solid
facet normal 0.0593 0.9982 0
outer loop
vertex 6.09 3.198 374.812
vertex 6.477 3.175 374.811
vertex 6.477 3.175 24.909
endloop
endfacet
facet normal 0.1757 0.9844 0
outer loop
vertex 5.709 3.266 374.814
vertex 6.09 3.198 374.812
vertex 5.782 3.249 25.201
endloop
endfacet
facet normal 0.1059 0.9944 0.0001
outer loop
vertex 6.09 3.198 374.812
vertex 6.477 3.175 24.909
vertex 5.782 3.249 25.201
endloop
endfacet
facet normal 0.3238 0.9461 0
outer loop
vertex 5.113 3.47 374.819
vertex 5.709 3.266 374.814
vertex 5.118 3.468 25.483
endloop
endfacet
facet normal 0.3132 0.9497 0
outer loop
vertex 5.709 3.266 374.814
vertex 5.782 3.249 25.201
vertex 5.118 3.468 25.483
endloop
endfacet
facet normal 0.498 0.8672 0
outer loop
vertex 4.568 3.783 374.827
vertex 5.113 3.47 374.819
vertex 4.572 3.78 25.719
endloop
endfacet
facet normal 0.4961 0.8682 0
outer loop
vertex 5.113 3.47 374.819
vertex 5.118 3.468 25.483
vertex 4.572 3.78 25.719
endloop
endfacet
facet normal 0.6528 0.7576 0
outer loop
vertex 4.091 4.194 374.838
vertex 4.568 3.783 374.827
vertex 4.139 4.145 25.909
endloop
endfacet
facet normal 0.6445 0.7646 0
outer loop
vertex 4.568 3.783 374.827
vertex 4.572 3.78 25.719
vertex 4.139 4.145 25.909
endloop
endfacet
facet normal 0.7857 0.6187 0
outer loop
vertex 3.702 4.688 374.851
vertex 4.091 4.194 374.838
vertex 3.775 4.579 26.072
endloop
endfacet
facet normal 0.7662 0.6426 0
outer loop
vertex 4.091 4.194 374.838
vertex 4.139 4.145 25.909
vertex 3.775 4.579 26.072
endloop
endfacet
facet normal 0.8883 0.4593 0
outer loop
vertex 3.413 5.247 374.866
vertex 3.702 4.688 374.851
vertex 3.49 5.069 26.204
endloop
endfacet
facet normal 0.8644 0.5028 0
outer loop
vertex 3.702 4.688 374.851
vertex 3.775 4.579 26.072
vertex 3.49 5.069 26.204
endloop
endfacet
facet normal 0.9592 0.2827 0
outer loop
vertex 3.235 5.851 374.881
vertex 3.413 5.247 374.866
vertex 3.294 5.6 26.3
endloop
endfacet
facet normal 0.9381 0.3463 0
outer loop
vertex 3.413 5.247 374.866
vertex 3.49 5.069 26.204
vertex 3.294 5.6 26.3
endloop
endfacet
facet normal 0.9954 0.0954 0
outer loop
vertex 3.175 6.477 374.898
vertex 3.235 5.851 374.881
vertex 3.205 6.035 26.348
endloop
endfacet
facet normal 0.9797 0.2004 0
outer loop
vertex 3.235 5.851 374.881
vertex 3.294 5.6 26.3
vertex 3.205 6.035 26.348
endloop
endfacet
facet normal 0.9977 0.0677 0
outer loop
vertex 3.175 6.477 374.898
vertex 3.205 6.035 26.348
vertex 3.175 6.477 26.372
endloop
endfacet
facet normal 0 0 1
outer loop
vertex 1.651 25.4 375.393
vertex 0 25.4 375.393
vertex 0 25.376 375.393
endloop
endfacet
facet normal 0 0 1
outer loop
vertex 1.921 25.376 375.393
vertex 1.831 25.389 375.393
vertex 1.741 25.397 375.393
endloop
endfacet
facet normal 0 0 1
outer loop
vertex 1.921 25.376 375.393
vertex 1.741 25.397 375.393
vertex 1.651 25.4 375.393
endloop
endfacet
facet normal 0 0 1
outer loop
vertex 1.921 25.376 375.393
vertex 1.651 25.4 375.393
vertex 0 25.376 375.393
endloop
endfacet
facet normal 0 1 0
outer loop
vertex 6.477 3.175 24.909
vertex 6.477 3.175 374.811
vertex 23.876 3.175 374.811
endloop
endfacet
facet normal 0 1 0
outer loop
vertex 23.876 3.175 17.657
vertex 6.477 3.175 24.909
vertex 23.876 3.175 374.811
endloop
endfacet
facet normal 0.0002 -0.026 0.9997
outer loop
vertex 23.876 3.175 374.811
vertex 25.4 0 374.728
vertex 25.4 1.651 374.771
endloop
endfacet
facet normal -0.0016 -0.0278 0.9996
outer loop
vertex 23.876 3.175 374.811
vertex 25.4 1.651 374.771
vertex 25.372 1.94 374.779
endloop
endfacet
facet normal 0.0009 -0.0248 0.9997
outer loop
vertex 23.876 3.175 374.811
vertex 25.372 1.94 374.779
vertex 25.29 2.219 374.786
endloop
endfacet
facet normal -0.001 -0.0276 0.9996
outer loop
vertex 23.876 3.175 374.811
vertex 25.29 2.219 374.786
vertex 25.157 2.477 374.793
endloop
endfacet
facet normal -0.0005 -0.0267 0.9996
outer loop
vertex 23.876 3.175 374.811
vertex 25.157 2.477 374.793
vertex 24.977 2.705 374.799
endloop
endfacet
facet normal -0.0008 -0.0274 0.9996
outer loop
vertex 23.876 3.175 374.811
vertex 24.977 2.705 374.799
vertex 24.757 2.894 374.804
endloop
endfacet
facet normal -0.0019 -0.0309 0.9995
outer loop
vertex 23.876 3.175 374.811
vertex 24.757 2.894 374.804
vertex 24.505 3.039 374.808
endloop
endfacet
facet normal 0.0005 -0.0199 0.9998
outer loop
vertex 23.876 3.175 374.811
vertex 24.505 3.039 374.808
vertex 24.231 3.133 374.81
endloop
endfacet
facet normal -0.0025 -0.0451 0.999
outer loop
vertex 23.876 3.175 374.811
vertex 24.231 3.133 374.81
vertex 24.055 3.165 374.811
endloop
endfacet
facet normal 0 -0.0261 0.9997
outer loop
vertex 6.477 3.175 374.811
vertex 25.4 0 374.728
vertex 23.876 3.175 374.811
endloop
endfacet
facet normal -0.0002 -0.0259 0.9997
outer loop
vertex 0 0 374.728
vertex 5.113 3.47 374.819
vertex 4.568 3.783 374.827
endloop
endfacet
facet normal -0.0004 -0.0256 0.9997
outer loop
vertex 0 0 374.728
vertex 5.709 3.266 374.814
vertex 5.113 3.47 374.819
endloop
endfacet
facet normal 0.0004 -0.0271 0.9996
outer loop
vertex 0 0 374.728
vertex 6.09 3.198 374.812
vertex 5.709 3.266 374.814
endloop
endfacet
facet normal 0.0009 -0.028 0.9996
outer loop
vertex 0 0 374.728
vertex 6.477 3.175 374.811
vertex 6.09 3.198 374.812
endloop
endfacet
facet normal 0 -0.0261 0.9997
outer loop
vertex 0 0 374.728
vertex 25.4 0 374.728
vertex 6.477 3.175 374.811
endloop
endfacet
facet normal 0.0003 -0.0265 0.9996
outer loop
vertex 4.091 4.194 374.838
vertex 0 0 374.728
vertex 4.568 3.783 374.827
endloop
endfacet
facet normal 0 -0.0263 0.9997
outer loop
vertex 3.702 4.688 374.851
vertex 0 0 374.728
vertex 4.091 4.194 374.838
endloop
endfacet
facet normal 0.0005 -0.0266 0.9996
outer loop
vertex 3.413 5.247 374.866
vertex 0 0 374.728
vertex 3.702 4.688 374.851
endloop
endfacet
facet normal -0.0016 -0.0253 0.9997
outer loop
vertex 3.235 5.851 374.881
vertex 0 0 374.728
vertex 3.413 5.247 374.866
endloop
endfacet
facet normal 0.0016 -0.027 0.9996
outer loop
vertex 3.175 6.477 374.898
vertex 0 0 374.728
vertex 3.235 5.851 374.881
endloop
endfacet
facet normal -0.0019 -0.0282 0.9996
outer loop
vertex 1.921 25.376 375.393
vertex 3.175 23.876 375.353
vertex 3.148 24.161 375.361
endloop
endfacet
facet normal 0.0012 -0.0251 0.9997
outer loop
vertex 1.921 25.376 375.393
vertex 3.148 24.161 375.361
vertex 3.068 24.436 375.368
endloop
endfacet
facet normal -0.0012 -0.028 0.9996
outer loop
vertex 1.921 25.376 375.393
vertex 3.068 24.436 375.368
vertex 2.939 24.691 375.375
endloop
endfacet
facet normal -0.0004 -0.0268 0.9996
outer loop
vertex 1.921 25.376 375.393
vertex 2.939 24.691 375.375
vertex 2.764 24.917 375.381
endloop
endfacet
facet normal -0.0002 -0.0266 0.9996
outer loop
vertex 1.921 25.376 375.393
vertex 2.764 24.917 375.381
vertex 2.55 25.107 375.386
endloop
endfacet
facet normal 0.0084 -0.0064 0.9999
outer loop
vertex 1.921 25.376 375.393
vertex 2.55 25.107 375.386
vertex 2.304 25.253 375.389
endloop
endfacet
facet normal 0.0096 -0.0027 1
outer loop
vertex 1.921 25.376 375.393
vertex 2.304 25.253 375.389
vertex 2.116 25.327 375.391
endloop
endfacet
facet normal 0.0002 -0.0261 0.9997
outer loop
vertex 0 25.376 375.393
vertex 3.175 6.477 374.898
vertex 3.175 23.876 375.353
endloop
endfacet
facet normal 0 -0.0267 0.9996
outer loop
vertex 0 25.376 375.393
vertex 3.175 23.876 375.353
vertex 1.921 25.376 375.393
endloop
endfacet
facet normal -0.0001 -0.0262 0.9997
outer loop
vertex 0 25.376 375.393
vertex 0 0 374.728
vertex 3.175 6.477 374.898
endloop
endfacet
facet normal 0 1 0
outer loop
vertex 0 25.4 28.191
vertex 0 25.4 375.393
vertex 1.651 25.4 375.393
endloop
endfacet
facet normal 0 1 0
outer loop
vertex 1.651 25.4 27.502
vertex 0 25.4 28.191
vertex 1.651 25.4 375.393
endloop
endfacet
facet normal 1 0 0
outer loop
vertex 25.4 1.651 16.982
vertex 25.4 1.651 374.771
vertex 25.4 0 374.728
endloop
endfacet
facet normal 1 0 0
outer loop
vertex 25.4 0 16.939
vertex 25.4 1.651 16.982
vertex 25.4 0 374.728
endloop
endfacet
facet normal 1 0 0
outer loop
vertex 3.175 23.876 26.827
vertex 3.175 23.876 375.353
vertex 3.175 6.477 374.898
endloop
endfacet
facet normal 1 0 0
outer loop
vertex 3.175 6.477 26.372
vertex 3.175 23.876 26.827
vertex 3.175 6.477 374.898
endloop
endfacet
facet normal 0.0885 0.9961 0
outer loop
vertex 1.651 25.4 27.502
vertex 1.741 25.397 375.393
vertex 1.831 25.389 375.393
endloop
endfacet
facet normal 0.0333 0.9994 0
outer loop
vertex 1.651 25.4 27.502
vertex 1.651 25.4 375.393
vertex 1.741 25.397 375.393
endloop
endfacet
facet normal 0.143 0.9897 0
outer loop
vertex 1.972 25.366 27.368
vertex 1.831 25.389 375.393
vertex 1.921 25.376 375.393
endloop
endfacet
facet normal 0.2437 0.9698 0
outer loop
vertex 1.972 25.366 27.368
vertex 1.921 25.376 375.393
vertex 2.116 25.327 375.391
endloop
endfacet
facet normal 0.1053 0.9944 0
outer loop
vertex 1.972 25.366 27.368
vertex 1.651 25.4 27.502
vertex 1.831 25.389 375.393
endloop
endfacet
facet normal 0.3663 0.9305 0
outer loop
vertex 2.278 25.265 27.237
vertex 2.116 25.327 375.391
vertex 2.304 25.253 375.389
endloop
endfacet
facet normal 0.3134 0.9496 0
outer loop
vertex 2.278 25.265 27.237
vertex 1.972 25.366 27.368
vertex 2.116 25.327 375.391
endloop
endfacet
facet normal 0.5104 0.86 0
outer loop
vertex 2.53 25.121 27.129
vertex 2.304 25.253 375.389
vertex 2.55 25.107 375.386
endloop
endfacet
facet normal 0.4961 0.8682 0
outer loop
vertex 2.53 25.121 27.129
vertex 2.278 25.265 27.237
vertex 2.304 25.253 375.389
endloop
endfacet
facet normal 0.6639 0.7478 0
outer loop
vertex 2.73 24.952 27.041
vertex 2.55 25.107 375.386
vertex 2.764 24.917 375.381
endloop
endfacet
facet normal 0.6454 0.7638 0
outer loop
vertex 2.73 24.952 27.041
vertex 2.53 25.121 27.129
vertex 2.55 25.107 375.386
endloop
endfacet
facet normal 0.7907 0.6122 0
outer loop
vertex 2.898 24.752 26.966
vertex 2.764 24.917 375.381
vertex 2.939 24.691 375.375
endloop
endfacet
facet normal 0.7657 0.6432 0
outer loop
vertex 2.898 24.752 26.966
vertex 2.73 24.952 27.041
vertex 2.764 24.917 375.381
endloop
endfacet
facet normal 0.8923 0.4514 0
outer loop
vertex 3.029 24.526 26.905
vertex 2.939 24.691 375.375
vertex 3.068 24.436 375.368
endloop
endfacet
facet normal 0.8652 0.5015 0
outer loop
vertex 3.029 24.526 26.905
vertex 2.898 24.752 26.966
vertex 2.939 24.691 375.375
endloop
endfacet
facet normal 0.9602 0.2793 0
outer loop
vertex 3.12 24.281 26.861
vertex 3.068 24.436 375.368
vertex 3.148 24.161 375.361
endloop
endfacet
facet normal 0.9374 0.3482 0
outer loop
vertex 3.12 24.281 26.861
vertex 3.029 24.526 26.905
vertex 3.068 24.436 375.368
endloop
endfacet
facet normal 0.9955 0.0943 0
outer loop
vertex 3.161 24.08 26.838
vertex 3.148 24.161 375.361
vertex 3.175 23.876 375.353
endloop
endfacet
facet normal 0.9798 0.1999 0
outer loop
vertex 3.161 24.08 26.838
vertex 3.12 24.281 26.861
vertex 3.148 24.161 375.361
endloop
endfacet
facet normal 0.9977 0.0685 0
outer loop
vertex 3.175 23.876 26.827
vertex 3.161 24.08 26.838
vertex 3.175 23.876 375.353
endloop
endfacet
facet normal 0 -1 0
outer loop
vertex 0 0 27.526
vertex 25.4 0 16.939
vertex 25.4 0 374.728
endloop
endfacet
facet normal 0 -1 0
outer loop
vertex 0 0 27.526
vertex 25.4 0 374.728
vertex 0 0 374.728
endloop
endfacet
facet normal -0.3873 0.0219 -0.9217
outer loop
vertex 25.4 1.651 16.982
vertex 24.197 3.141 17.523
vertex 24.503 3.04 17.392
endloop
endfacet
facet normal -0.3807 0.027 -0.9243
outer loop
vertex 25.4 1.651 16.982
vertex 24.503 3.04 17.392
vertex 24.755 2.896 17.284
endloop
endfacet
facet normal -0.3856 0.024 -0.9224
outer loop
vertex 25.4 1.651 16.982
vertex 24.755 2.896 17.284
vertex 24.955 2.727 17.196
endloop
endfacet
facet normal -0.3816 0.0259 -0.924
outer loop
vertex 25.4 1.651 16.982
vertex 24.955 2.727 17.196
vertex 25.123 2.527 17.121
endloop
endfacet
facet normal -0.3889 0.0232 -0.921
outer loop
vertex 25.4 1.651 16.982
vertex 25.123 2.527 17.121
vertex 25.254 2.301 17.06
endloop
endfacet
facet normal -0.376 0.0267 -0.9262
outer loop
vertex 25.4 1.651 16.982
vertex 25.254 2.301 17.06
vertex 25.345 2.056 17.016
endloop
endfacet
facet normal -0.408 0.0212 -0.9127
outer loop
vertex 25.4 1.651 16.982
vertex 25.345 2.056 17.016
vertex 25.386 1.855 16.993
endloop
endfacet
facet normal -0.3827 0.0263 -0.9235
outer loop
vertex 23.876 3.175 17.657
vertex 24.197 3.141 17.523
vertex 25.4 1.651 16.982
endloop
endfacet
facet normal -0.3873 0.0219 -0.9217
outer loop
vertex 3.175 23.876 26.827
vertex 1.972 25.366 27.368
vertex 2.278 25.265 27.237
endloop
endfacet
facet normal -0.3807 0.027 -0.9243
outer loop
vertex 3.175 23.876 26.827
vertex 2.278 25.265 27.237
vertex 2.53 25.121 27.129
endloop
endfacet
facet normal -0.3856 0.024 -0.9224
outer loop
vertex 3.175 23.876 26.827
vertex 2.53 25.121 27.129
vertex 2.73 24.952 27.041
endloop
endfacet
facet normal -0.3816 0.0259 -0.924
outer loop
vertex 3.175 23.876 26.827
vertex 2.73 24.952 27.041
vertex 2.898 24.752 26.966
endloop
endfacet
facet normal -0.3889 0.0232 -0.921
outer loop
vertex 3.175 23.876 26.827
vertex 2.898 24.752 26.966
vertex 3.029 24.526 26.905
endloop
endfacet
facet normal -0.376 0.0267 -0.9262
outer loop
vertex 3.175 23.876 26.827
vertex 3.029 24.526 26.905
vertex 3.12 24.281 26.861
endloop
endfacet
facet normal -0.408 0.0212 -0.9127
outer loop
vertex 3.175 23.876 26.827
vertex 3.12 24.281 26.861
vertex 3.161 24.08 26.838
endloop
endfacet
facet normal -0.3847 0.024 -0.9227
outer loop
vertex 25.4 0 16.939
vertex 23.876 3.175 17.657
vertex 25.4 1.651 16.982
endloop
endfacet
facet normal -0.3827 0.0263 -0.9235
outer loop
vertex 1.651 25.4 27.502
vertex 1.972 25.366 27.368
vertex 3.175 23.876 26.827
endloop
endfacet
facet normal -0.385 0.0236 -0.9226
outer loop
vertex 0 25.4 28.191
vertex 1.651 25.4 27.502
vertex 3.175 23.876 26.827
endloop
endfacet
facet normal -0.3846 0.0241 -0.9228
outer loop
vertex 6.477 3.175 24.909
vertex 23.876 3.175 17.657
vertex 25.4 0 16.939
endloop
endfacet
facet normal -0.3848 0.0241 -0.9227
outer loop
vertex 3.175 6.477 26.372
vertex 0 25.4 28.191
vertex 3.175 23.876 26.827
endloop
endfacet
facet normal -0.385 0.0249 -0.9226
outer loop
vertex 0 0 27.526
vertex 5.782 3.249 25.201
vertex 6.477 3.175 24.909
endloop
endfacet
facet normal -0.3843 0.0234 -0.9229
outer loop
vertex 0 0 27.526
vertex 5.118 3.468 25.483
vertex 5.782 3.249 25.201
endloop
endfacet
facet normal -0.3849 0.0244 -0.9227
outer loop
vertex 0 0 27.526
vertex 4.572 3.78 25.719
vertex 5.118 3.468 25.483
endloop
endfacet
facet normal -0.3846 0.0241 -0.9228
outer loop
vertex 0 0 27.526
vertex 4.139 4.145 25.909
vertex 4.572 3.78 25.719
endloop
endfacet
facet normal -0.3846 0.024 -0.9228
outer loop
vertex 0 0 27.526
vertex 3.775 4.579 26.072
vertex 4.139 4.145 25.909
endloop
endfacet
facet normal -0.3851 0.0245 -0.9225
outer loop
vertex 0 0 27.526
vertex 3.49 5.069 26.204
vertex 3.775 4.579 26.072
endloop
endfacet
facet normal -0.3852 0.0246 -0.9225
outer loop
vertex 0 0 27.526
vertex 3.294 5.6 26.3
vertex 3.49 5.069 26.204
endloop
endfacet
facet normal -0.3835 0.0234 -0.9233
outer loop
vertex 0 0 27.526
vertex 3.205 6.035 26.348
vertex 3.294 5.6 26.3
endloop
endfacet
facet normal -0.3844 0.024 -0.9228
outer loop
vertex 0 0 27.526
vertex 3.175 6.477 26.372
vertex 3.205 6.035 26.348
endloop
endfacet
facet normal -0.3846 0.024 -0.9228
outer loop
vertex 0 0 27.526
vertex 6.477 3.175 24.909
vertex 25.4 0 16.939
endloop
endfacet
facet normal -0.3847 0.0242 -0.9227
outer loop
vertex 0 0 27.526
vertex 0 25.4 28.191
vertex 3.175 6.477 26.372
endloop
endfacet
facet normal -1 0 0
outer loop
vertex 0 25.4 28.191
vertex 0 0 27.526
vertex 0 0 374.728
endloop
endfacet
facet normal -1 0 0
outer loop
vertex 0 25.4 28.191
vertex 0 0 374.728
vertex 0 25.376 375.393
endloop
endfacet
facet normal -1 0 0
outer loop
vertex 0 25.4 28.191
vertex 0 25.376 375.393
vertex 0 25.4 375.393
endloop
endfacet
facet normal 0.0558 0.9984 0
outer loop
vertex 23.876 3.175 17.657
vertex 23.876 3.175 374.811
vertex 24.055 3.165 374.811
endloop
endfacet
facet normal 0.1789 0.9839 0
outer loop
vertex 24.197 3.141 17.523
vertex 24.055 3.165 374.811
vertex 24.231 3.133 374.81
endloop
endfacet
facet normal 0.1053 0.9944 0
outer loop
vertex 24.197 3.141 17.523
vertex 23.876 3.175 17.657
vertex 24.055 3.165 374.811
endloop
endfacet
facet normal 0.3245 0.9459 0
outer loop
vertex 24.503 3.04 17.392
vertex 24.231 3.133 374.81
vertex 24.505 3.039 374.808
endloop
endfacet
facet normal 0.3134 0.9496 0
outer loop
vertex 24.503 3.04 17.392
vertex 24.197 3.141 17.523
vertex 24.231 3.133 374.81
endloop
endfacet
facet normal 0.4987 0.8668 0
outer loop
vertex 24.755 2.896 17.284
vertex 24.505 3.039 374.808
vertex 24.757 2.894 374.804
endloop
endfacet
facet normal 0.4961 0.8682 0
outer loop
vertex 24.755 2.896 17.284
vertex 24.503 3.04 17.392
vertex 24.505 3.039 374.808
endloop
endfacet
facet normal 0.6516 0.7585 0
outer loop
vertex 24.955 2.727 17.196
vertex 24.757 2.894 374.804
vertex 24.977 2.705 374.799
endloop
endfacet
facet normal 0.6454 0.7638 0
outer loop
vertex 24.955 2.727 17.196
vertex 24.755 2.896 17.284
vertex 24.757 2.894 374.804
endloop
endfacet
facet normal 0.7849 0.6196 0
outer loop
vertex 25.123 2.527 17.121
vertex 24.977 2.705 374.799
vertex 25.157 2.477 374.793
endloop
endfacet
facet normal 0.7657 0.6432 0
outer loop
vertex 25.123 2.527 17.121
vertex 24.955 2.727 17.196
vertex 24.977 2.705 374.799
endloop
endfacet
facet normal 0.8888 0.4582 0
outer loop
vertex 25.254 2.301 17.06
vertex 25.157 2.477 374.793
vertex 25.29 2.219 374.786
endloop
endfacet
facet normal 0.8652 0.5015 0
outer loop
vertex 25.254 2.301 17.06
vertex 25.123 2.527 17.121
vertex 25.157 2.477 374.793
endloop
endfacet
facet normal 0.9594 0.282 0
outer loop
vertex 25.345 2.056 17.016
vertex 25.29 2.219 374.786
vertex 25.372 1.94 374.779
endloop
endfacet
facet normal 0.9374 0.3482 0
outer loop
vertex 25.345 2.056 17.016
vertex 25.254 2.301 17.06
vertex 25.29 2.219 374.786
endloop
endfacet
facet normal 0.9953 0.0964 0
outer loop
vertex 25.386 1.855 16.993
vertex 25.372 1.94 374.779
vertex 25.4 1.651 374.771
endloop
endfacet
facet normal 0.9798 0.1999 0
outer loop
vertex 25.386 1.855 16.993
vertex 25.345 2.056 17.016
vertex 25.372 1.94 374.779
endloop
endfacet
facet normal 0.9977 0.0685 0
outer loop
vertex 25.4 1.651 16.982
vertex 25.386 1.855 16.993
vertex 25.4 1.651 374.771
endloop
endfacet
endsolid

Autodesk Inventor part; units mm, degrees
ref_plane "Start Plane" through (0, 0, 16.9391) normal (0, 0, 1) x (1, 0, 0)
ref_plane "End Plane" through (0, 0, 375.3926) normal (0, 0, 1) x (1, 0, 0)
sketch "Sketch" plane through (0, 0, 0) normal (0, 0, 1) x (1, 0, 0)
  line L0 (25.4, 0) -> (0, 0)
  line L1 (0, 0) -> (0, 25.4)
  line L2 (0, 25.4) -> (1.651, 25.4)
  line L3 (3.175, 23.876) -> (3.175, 6.477)
  line L4 (6.477, 3.175) -> (23.876, 3.175)
  line L5 (25.4, 1.651) -> (25.4, 0)
  line L6 (0, -11.0414) -> (0, 31.5385) construction
  line L7 (-11.0414, 0) -> (31.5385, 0) construction
  arc A0 (3.175, 6.477) -> (6.477, 3.175) centre (6.477, 6.477) ccw
  arc A1 (3.175, 23.876) -> (1.651, 25.4) centre (1.651, 23.876) ccw
  arc A2 (25.4, 1.651) -> (23.876, 3.175) centre (23.876, 1.651) ccw
  line L8 (0, 40.0545) -> (0, -19.5574) construction
  line L9 (-19.5574, 0) -> (40.0545, 0) construction
  point P0 (3.175, 25.4)
  point P1 (3.175, 3.175)
  point P2 (25.4, 3.175)
  dimension "d0" = 25.4
  dimension "d1" = 25.4
  dimension "d2" = 3.175
  dimension "d3" = 3.175
  dimension "d10" = 0
  dimension "d11" = 0
  dimension "d14" = 3.302
  dimension "d15" = 1.524
extrude "Body" add sketch "Sketch" along normal up to surface (358.4535 mm away) from surface at 16.9391
sketch "Sketch3" plane through (0, 0, 0) normal (0, 0, 1) x (1, 0, 0)
  line L0 (0, 0) -> (10, 0)
ref_plane "Work Plane3" through (0, 0, 0) normal (0, -1, 0) x (1, 0, 0)
ref_plane "Work Plane5" through (690, 0.6642, 374.7455) normal (0, -0.0261508, 0.999658) x (1, 0, 0)
split "Split2" plane through (690, 0.6642, 374.7455) removes the side toward (0, -0.0261508, 0.999658)
ref_plane "Work Plane6" through (249.7692, 1061.6394, -48.8078) normal (-0.3846154, 0.0241392, -0.9227612) x (-0.9152171, 0.1202029, 0.3846154)
split "Split3" plane through (249.7692, 1061.6394, -48.8078) removes the side toward (-0.3846154, 0.0241392, -0.9227612)
sketch "Sketch4" plane through (0, 0, 0) normal (0, -1, 0) x (1, 0, 0)
  line L0 (-2, 16.9391) -> (12, 16.9391) projected
  line L1 (-2, 375.3926) -> (12, 375.3926) projected
  dimension "d17" = 358.4535
equation "\"d0\" = G_H"
equation "\"d1\" = G_H"
equation "\"d2\" = G_T"
equation "\"d3\" = G_T"
equation "\"d14\" = G_IR"
equation "\"d15\" = G_ER"
equation "\"d4\" = G_L"
equation "\"G_H\" = 25.4"
equation "\"G_T\" = 3.175"
equation "\"G_ER\" = 1.524"
equation "\"G_IR\" = 3.302"
equation "\"G_L\" = d17"
equation "\"ex\" = 0"
equation "\"G_OFFSET_START\" = -16.93913"
equation "\"G_OFFSET_END\" = -24.74423"
equation "\"d12\" = -G_OFFSET_START"
equation "\"d13\" = G_OFFSET_END + B_L"
equation "\"B_L\" = 400.13684"
properties part number "AISC - L 1 x 1 x 1/8 - 14.112" material "Steel, Mild"
